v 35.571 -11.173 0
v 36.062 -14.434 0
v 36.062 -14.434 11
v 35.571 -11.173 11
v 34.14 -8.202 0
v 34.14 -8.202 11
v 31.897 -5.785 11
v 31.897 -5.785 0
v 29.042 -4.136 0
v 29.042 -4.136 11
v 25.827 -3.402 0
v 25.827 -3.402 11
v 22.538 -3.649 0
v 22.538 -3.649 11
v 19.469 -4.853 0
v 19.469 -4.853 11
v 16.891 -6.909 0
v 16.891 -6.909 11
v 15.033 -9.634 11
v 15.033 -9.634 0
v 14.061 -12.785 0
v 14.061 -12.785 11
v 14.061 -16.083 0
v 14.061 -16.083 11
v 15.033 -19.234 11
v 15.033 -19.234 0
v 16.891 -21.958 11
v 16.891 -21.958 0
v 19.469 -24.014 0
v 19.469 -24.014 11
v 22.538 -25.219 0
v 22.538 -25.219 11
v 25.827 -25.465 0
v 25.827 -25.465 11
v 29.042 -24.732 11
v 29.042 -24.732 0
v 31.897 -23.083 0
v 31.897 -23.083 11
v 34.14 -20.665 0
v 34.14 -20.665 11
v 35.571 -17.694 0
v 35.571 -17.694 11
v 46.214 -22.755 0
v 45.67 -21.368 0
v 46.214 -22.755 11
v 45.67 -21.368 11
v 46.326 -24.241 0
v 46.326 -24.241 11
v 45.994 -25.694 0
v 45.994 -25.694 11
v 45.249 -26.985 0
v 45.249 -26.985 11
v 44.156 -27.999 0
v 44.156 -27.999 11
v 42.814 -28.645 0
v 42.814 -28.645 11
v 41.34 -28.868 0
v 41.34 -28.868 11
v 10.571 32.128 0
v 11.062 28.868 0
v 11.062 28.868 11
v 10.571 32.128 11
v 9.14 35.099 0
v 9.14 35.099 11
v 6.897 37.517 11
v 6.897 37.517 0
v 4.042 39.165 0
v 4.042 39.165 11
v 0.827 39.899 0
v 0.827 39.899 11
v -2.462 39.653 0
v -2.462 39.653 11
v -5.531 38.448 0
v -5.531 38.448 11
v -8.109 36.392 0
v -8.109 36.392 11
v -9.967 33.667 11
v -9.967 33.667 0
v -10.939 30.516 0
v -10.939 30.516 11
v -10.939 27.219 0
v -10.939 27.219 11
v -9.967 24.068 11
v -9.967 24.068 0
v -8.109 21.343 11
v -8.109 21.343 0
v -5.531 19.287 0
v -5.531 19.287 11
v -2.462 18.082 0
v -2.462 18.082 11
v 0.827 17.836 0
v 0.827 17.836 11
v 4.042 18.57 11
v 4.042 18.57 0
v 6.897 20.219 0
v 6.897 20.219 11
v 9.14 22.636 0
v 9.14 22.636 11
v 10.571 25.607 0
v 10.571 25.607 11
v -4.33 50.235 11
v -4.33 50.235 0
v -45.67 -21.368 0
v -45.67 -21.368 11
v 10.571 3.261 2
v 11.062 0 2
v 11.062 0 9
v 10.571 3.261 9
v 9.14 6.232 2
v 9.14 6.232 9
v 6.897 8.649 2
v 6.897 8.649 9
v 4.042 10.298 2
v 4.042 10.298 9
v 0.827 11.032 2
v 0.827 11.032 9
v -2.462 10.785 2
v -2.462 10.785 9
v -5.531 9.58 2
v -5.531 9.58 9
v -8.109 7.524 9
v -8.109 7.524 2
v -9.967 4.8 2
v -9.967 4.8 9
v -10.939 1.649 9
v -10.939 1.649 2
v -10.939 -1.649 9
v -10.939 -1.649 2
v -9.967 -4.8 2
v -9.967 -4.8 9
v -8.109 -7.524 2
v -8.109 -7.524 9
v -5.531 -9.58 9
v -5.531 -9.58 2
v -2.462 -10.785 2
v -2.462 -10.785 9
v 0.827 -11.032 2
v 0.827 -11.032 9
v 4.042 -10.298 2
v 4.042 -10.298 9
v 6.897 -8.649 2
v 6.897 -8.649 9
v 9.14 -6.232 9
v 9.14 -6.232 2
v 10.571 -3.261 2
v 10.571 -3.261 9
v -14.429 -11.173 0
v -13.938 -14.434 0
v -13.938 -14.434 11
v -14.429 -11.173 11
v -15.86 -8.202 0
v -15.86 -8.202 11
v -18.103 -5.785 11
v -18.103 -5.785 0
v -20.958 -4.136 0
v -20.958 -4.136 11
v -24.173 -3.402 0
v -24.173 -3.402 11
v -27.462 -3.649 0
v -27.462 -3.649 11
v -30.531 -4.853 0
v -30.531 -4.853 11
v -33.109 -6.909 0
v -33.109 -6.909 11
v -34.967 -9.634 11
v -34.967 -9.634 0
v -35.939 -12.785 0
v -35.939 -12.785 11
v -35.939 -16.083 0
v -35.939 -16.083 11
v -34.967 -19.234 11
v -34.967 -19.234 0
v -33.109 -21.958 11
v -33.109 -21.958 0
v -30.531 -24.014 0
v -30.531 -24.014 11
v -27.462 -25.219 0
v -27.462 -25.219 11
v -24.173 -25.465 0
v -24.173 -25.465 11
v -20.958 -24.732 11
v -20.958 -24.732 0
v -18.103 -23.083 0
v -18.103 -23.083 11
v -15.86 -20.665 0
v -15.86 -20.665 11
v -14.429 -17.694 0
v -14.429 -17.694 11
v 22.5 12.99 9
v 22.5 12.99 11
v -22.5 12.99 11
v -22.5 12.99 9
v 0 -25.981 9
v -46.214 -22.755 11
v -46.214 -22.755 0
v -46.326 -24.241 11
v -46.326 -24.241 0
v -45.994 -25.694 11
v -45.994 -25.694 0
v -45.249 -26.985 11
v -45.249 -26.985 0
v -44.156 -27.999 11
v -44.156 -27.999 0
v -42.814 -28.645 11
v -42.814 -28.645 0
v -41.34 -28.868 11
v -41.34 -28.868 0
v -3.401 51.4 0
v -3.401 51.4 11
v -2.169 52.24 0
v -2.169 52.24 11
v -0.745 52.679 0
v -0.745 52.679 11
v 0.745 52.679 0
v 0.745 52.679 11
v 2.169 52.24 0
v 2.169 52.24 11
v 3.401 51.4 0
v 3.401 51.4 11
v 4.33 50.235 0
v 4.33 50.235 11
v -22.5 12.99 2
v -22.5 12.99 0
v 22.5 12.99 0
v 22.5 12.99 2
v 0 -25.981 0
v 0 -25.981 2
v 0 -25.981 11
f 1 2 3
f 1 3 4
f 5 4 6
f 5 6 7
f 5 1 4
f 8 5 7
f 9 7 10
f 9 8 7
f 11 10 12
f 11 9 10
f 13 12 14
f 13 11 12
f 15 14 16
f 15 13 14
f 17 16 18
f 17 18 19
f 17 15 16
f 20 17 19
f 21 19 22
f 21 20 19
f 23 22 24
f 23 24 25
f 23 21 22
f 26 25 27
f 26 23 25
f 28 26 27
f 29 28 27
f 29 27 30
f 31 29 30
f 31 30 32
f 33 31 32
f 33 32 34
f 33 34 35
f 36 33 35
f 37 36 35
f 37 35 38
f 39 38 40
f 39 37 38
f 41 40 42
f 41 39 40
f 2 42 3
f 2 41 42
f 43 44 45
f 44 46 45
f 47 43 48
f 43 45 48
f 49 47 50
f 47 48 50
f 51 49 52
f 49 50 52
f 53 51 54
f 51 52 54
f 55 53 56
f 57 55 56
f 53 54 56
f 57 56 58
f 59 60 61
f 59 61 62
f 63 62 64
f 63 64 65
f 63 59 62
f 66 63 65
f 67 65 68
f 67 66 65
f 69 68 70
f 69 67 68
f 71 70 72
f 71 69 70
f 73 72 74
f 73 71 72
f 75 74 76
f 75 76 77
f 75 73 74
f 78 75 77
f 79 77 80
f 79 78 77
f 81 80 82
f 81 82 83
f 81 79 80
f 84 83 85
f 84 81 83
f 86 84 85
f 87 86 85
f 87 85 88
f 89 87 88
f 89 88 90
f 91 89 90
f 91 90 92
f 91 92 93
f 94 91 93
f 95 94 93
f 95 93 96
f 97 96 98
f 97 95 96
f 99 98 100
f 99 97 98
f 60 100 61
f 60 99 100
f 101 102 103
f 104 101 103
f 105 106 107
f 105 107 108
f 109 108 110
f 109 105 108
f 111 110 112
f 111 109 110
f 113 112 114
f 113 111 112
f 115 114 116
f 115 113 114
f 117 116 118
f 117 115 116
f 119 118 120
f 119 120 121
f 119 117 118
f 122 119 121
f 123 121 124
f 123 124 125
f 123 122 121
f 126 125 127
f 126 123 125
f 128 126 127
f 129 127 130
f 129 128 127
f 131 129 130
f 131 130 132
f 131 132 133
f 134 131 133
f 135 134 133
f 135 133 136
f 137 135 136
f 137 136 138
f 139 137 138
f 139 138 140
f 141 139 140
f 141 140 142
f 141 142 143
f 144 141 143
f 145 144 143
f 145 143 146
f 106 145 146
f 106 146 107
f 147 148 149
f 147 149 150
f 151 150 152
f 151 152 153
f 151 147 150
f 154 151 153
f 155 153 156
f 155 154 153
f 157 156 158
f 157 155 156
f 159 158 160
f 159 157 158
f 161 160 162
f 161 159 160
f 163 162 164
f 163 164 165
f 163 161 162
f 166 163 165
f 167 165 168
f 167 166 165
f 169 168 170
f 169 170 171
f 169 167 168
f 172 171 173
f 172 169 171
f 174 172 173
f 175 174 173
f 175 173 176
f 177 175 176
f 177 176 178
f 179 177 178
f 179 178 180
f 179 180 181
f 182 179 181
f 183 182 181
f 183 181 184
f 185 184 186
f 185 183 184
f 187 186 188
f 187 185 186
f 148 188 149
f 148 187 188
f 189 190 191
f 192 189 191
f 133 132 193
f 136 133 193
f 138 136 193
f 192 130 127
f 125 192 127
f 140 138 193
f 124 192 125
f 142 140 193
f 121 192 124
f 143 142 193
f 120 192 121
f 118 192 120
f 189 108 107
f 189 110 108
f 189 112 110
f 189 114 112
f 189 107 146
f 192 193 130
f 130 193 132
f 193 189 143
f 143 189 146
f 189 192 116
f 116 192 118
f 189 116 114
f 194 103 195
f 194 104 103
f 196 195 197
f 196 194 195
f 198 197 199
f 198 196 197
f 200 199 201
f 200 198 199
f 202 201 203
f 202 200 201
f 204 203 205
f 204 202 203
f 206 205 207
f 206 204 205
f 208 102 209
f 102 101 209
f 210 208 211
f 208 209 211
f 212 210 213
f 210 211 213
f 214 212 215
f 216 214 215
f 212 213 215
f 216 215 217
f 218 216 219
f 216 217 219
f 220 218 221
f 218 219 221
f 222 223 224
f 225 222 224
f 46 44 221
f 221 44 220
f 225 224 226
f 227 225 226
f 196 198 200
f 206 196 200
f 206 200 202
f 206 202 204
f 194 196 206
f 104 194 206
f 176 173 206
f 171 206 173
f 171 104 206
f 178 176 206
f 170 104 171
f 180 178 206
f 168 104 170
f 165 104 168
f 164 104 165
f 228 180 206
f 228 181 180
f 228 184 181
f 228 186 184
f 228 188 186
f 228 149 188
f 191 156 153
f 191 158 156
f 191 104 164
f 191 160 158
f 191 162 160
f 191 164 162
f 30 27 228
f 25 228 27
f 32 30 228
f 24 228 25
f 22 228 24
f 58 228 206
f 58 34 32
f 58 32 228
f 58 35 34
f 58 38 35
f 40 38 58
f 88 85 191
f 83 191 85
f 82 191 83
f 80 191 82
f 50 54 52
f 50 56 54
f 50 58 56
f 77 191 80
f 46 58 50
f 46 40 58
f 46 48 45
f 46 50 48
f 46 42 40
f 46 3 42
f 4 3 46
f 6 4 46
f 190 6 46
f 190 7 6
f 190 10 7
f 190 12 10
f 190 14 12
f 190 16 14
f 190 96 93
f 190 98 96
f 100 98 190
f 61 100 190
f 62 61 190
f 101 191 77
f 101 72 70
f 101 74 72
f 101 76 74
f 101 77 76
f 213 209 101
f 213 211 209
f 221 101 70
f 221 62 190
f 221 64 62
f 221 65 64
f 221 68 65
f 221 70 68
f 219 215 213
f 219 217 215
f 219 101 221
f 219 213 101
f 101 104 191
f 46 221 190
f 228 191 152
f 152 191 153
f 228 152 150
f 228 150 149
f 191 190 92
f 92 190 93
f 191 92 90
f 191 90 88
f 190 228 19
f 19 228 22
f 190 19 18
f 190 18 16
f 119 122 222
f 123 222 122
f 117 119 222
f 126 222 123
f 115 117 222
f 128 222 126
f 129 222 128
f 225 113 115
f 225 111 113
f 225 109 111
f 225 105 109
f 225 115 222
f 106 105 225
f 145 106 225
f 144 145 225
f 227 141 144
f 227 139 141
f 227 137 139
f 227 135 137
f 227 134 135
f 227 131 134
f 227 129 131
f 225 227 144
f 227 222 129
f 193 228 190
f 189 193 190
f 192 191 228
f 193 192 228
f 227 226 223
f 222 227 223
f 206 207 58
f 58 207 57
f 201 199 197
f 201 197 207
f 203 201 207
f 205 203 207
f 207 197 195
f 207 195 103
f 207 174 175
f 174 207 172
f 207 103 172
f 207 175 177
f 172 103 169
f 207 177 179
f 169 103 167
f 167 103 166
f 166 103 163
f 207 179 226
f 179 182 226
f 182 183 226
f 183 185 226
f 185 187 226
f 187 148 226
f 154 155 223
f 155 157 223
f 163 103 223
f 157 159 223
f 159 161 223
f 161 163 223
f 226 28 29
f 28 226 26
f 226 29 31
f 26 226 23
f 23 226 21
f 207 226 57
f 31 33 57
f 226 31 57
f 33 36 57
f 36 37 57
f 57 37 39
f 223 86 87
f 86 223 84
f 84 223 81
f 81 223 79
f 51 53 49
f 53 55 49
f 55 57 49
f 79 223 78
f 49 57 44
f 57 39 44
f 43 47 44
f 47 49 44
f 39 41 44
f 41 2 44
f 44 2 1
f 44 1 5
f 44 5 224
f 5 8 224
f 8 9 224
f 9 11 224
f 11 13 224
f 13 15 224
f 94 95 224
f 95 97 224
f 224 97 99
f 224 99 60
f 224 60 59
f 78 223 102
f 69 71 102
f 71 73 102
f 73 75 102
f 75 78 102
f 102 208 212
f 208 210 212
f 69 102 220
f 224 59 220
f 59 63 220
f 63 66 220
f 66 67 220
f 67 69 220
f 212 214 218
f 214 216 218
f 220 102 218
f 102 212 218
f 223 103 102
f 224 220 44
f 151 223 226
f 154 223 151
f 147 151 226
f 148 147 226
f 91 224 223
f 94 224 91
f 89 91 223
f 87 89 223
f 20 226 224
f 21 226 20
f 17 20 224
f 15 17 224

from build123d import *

# Parameters (mm, degrees)
F0_R     = 11.0625
F1_DEPTH = 11
F2_R     = 5
F3_R     = 11.0625
F4_DEPTH = 2
F6_DEPTH = 2


with BuildPart() as f1:
    # F0 (on Top) → F1 (new body)
    with BuildSketch(Plane.XY):
        Polygon((25, 14.433757), (0, 57.735027), (-25, 14.433757), align=None)
        with Locations((0, 28.867513)):
            Circle(F0_R, mode=Mode.SUBTRACT)
        Polygon((0, -28.867513), (-25, 14.433757), (-50, -28.867513), align=None)
        with Locations((-25, -14.433757)):
            Circle(F0_R, mode=Mode.SUBTRACT)
        Polygon((50, -28.867513), (25, 14.433757), (0, -28.867513), align=None)
        with Locations((25, -14.433757)):
            Circle(F0_R, mode=Mode.SUBTRACT)
        Polygon((25, 14.433757), (-25, 14.433757), (0, -28.867513), align=None)
        Circle(F0_R, mode=Mode.SUBTRACT)
    extrude(amount=F1_DEPTH)

    # F2
    f2_edges = [f1.edges().sort_by_distance(p)[0] for p in [
        (50, -28.867513, 5.5),
        (0, 57.735027, 5.5),
        (-50, -28.867513, 5.5),
    ]]
    fillet(f2_edges, radius=F2_R)

    # F3 (on face) → F4 (cut)
    with BuildSketch(Plane.XY.offset(11)):
        Polygon((-22.5, 12.990381), (0, -25.980762), (22.5, 12.990381), align=None)
        Circle(F3_R, mode=Mode.SUBTRACT)
    extrude(amount=-F4_DEPTH, mode=Mode.SUBTRACT)

    # F5 (on face) → F6 (cut)
    with BuildSketch(Plane(origin=(0, 0, 0), x_dir=(1, 0, 0), z_dir=(0, 0, -1))):
        Polygon((-22.5, -12.990381), (22.5, -12.990381), (0, 25.980762), align=None)
    extrude(amount=-F6_DEPTH, mode=Mode.SUBTRACT)


solid = f1.part
